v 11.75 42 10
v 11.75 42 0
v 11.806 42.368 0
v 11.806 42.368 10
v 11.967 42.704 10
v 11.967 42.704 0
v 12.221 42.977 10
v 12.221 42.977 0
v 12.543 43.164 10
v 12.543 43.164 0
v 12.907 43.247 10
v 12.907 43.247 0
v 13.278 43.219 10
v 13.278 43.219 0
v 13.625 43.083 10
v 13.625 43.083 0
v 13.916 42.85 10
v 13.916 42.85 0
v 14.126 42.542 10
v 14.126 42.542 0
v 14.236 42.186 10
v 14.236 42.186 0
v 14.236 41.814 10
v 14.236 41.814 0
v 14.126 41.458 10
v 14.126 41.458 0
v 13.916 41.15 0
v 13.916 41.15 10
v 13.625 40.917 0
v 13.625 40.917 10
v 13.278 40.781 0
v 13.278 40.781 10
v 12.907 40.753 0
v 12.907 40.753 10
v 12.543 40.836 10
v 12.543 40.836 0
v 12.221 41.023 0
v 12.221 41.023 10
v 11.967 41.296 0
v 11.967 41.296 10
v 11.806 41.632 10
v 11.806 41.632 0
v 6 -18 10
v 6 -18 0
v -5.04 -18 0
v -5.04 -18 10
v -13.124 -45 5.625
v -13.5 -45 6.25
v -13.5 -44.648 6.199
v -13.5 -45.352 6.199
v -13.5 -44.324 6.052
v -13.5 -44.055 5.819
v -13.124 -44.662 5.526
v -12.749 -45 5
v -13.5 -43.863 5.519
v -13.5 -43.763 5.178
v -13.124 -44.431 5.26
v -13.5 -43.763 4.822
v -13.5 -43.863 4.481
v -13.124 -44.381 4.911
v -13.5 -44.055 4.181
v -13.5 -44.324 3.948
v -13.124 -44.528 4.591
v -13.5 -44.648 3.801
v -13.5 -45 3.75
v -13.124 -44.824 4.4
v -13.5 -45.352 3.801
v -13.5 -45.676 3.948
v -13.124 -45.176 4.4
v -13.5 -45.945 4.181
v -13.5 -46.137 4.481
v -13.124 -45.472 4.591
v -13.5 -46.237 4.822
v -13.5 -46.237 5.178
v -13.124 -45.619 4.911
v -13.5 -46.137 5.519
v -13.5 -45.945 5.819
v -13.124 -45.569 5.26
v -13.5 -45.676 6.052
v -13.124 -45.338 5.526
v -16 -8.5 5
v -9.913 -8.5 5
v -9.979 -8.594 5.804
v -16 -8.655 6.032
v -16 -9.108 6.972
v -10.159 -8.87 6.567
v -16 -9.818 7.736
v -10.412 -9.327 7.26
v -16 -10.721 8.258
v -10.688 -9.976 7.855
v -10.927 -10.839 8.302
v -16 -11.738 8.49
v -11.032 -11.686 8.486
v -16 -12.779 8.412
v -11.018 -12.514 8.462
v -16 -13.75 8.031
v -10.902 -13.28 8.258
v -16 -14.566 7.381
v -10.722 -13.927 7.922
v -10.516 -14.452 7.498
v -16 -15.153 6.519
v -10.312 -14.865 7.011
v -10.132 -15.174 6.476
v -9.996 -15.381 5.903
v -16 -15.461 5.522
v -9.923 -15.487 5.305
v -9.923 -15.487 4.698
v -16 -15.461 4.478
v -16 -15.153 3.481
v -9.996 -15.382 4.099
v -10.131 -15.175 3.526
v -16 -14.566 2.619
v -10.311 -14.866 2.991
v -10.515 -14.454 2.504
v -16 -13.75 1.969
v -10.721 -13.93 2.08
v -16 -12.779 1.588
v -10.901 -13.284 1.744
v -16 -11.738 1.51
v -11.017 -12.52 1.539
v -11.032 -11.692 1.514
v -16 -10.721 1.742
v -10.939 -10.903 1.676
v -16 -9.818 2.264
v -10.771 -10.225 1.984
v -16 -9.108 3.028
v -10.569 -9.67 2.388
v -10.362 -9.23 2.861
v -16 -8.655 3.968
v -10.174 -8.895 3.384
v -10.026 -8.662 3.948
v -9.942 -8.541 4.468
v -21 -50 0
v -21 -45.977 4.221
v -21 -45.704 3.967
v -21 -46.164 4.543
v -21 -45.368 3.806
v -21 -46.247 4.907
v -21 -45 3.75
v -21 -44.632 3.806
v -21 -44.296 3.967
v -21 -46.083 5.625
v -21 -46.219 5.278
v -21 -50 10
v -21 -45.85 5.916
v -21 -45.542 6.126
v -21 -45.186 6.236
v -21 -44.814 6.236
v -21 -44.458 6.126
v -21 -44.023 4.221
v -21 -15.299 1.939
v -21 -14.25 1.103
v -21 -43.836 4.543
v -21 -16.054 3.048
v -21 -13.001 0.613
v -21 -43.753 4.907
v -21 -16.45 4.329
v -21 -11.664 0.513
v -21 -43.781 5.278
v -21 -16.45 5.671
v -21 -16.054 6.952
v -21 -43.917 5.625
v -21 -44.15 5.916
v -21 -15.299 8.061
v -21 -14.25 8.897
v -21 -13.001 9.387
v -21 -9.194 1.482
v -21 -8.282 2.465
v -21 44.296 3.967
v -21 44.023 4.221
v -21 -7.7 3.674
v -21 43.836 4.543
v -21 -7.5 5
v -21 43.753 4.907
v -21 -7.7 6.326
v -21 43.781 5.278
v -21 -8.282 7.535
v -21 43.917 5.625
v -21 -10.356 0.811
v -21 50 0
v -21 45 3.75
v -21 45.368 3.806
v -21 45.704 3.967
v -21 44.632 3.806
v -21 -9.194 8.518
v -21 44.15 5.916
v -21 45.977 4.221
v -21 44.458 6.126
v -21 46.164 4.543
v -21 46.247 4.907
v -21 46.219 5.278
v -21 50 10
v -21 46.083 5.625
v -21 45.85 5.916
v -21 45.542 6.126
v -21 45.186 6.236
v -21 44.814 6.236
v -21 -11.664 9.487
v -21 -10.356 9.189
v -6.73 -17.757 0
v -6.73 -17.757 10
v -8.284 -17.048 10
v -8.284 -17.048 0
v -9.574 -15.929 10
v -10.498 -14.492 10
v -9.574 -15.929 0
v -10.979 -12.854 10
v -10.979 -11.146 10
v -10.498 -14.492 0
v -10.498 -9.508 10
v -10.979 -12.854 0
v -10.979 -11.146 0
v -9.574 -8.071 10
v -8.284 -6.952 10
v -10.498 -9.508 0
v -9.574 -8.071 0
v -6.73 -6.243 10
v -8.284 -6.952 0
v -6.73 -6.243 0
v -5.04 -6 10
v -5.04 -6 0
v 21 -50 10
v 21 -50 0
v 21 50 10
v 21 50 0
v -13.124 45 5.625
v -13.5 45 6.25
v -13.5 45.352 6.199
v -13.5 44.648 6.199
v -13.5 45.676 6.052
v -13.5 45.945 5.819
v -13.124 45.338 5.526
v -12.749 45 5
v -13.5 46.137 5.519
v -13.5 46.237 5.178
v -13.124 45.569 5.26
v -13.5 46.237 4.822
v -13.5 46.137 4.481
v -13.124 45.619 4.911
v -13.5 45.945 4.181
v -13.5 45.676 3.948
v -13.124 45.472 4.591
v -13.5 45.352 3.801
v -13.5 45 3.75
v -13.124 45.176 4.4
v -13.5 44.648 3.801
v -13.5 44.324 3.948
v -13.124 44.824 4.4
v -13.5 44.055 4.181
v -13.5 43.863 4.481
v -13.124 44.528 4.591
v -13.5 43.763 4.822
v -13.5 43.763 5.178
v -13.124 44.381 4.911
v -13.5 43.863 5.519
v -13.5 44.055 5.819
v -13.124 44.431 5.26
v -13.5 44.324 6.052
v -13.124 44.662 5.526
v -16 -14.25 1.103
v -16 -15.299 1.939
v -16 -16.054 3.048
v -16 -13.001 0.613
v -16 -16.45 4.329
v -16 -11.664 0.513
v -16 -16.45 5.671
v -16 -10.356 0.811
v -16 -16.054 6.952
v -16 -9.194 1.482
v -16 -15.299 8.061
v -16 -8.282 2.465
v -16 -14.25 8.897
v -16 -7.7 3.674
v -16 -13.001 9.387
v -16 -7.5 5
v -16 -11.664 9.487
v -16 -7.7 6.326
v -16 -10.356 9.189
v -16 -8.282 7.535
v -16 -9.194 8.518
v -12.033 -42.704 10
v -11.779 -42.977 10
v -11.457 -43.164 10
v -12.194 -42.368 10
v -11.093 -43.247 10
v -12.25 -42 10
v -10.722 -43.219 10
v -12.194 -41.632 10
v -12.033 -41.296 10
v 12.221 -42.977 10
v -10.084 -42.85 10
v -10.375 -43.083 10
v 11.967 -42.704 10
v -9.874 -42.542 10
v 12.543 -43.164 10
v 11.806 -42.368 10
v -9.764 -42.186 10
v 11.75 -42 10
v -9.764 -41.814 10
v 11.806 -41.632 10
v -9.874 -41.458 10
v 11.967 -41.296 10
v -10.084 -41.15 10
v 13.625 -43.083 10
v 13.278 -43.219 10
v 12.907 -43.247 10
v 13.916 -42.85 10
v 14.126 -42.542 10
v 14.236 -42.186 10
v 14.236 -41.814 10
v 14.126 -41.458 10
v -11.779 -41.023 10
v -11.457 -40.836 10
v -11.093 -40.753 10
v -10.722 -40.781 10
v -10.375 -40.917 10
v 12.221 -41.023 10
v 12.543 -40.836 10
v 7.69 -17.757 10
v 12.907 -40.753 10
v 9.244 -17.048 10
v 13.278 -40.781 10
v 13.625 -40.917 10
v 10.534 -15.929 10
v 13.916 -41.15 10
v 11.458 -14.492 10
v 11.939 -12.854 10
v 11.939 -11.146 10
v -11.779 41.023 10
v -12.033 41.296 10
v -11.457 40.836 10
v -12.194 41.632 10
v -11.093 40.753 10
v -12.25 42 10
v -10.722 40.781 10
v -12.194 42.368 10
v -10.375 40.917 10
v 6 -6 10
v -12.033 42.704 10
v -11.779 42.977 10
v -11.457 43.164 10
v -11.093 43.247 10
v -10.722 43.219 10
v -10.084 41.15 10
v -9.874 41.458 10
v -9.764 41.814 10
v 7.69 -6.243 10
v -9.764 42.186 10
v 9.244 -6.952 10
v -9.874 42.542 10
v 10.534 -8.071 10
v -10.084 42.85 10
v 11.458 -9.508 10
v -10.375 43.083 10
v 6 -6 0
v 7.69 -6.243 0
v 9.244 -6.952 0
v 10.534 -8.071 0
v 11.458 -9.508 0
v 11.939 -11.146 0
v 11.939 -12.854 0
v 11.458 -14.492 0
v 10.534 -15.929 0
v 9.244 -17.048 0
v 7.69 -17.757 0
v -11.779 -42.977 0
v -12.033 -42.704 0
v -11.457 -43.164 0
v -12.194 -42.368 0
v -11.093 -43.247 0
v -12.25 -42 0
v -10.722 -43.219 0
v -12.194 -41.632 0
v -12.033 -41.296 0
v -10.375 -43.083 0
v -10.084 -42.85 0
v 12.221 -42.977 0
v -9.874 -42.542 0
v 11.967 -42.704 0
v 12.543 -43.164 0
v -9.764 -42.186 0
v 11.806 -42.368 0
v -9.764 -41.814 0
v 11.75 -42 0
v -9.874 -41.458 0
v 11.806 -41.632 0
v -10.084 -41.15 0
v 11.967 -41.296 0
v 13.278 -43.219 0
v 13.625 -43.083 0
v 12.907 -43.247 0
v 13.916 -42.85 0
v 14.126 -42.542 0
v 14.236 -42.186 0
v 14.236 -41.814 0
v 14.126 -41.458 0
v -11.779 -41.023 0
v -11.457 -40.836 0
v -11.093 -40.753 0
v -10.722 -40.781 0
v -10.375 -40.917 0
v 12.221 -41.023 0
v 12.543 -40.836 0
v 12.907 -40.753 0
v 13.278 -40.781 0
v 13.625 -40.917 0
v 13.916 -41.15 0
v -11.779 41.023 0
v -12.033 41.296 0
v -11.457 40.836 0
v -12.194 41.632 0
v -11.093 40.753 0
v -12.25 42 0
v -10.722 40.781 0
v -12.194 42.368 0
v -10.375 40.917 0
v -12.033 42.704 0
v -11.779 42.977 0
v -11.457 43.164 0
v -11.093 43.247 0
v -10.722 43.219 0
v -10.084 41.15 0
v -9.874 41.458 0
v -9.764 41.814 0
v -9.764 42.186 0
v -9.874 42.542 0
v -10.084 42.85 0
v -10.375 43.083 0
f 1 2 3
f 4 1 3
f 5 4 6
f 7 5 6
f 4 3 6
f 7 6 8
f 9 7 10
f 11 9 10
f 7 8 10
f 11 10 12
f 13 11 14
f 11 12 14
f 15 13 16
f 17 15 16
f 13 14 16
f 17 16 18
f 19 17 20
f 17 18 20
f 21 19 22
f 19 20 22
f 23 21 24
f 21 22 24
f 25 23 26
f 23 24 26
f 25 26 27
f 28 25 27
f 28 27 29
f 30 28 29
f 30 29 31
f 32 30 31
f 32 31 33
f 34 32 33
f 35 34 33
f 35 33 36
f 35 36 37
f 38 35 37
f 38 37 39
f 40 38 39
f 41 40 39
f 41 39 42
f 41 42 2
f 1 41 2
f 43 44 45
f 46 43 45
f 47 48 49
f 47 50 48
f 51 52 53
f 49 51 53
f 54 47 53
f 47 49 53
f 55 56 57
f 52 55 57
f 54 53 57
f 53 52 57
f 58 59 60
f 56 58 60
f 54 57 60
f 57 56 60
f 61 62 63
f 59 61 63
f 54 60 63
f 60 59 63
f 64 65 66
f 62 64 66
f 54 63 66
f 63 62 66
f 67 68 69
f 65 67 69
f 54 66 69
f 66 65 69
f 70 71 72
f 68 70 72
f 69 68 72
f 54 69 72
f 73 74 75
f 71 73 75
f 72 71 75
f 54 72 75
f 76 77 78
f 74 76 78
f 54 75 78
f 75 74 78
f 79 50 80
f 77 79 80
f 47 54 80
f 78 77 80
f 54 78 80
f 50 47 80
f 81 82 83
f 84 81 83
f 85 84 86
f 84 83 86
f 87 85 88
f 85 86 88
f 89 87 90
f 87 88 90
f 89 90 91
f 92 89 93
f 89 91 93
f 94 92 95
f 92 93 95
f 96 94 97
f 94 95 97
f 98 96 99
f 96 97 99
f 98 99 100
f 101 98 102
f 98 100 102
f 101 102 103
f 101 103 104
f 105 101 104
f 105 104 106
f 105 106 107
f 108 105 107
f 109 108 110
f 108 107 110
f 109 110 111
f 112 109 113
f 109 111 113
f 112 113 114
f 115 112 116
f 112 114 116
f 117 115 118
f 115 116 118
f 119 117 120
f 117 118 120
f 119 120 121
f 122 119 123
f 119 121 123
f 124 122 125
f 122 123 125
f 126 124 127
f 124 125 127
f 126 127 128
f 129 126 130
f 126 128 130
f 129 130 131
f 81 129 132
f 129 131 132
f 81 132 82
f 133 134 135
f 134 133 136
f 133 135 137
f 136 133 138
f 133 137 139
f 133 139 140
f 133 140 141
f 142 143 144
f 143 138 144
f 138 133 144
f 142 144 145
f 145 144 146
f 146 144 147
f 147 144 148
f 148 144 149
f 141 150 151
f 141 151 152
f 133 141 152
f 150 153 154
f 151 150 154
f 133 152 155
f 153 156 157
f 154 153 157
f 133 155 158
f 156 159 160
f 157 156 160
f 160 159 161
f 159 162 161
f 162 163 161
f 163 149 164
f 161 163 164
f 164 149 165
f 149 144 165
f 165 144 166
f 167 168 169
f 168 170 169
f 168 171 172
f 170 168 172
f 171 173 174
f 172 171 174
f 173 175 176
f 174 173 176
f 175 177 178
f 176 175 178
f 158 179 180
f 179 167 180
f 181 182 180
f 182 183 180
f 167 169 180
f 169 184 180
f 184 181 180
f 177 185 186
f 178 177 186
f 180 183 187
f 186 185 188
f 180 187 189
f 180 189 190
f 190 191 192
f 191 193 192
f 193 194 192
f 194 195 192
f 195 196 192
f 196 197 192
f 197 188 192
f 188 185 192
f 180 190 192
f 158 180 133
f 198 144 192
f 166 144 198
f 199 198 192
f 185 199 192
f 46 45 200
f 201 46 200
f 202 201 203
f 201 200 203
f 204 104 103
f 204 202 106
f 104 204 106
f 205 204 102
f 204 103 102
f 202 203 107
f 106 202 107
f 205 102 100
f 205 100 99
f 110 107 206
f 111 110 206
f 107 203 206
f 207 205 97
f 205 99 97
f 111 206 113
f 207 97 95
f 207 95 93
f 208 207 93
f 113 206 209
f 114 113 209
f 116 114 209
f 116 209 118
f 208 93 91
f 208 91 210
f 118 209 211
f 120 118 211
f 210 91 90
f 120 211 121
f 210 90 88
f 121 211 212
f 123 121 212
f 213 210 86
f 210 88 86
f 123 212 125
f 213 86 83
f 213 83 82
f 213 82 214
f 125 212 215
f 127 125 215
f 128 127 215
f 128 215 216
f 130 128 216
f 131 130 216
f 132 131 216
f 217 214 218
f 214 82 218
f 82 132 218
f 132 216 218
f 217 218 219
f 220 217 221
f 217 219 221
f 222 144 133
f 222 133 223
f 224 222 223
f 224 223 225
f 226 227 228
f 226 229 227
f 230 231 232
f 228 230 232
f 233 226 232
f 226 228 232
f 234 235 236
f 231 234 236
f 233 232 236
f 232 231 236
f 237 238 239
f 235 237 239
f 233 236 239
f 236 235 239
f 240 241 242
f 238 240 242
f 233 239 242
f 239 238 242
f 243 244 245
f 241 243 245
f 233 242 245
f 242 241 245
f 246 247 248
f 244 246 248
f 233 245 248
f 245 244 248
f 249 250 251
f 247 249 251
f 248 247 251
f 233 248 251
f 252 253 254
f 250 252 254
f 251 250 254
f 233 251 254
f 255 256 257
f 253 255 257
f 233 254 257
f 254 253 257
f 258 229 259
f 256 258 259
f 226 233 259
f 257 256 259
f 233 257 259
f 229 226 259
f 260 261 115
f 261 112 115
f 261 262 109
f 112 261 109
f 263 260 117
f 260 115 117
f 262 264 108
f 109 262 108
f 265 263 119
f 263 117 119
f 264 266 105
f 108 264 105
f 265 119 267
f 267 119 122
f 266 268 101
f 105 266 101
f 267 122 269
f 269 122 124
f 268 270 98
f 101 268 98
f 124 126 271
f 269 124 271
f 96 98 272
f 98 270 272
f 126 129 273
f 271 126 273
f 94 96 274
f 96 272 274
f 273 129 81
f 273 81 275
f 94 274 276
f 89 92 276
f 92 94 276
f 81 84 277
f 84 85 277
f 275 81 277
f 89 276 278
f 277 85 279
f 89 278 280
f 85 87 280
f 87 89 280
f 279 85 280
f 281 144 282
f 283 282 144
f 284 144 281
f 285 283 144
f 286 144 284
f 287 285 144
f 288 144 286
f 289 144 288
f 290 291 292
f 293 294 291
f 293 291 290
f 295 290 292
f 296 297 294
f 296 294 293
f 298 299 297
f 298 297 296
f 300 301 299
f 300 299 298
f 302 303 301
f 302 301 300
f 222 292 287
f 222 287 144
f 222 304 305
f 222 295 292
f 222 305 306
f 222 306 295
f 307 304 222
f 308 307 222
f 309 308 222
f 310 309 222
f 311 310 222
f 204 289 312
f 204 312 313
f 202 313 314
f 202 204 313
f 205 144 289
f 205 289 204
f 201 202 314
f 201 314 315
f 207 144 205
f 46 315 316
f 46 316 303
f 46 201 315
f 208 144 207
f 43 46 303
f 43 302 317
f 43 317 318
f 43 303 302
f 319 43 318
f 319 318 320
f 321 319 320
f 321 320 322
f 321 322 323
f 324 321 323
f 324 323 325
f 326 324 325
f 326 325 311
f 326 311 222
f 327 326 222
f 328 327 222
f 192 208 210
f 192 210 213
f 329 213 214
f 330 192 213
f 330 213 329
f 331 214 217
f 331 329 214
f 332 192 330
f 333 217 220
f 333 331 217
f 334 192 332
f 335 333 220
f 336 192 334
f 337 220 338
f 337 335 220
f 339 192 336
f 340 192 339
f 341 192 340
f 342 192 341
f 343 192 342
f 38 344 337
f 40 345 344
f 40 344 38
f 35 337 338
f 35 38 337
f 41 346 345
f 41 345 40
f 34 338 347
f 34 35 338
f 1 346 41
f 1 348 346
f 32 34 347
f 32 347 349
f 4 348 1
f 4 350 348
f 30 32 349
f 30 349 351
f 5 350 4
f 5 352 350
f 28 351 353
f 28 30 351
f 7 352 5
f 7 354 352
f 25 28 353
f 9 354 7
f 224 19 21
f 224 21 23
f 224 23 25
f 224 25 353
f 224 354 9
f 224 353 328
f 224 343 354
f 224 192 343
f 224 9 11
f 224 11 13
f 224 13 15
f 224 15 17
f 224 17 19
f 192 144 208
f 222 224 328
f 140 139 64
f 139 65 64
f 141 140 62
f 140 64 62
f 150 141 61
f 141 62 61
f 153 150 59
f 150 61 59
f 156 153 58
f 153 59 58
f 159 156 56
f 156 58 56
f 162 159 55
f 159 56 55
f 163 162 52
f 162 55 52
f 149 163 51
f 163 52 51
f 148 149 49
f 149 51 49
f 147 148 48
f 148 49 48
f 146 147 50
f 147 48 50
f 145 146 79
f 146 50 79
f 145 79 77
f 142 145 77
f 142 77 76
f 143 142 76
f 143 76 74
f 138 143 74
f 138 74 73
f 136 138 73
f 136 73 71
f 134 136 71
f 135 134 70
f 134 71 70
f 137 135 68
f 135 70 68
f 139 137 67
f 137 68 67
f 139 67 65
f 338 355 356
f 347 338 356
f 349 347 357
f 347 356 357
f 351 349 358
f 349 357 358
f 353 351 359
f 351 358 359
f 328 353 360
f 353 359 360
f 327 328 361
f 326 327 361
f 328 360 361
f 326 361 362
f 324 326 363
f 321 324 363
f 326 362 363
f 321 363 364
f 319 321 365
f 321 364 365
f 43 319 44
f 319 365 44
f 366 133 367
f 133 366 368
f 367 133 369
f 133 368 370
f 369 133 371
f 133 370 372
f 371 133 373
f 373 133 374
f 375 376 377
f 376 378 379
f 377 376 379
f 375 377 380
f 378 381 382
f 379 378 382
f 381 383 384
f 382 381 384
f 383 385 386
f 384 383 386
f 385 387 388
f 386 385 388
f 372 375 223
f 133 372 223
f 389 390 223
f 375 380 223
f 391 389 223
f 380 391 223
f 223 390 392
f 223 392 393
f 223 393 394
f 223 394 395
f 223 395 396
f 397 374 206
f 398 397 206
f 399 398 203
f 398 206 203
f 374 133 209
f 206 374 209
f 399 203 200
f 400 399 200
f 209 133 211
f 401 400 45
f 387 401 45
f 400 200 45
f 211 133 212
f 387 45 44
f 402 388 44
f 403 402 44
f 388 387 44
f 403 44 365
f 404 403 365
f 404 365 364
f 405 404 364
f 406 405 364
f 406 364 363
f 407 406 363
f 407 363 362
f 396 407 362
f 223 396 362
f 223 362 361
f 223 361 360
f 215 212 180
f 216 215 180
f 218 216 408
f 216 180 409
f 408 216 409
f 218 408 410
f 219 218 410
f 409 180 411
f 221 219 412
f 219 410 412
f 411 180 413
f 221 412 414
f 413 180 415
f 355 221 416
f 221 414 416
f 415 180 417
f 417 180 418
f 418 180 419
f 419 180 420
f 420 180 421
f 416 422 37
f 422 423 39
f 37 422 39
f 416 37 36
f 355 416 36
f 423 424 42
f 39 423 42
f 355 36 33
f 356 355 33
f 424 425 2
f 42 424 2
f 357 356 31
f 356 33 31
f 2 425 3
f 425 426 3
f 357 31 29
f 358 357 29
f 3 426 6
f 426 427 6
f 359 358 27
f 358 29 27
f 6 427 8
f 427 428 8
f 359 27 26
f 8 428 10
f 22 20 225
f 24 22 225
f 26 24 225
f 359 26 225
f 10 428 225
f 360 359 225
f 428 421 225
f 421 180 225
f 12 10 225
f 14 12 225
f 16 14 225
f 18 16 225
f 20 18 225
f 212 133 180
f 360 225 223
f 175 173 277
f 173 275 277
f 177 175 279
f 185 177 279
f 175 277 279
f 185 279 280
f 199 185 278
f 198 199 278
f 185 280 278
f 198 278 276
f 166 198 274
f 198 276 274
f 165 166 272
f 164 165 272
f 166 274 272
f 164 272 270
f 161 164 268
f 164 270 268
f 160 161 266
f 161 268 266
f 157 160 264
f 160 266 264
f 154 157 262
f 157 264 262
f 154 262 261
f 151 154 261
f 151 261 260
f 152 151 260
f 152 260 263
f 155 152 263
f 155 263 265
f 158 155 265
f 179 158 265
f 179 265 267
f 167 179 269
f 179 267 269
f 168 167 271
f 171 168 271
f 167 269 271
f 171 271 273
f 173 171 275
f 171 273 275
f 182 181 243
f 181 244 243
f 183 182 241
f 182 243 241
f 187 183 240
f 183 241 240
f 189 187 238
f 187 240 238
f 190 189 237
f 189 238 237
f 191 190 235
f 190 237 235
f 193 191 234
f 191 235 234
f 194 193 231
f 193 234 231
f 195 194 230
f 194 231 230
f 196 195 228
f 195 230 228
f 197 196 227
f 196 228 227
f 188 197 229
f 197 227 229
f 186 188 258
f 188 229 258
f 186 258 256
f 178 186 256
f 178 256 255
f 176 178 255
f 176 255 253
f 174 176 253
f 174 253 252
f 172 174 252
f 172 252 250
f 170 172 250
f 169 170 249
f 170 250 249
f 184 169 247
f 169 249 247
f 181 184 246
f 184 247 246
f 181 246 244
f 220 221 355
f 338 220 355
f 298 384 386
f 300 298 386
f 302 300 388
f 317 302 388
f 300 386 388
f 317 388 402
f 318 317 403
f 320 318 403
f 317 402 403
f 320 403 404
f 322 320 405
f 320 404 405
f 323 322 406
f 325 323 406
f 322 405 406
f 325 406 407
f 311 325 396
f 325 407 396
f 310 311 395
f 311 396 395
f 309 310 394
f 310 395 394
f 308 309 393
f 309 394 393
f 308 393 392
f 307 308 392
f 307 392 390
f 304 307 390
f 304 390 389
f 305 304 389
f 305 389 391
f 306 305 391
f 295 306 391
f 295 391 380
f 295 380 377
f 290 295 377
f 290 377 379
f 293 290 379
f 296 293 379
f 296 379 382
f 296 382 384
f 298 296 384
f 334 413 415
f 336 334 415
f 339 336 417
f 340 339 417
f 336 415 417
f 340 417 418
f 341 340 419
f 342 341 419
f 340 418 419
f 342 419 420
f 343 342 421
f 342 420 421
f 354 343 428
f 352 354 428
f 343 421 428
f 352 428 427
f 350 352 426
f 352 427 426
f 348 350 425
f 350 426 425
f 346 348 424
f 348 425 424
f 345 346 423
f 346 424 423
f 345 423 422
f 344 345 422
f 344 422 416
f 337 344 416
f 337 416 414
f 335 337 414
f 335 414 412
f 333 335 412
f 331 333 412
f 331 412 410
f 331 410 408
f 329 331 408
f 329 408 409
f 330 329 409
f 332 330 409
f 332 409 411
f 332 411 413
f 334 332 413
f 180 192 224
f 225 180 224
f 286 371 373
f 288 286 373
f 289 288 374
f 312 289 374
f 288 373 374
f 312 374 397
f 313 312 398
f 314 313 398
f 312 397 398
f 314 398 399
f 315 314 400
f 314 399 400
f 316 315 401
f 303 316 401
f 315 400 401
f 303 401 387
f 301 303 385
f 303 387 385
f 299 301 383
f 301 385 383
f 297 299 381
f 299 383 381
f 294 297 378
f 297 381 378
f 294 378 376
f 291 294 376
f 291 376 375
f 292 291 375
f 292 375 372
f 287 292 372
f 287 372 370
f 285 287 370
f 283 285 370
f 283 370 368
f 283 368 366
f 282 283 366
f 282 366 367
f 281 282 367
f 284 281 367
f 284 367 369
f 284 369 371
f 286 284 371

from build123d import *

# Parameters (mm, degrees)
SKETCH1_W                      = 42
SKETCH1_H                      = 100
BOSS_EXTRUDE1_DEPTH            = 10
CUT_EXTRUDE1_DEPTH             = 56.145262716
F_2_5_2_5_DIAMETER_HOLE1_D     = 2.5
F_2_5_2_5_DIAMETER_HOLE2_D     = 2.5
F_2_5_2_5_DIAMETER_HOLE2_DEPTH = 7.5
F_2_5_2_5_DIAMETER_HOLE2_TIP   = 0.751075774


# Read off the part's stored shape, not the designer's step: CBORE for M6 Hex Head Bolt1
with BuildPart() as part:
    # Sketch1 → Boss-Extrude1 (new body)
    with BuildSketch(Plane.XY.offset(10)):
        Rectangle(SKETCH1_W, SKETCH1_H)
    extrude(amount=-BOSS_EXTRUDE1_DEPTH)

    # Sketch2 → Cut-Extrude1 (cut, through all)
    with BuildSketch(Plane(origin=(0, 0, 0), x_dir=(-1, 0, 0), z_dir=(0, 0, -1))):
        with BuildLine():
            Line((5.04, -6), (-6, -6))
            ThreePointArc((-6, -6), (-12, -12), (-6, -18))
            Line((-6, -18), (5.04, -18))
            ThreePointArc((5.04, -18), (11.04, -12), (5.04, -6))
        make_face()
    extrude(amount=-CUT_EXTRUDE1_DEPTH, mode=Mode.SUBTRACT)

    # Ø2.5 (2.5) Diameter Hole1 (through all)
    with Locations(Plane.XY.offset(10)):
        with Locations((13, 42), (-11, 42), (-11, -42), (13, -42)):
            Hole(F_2_5_2_5_DIAMETER_HOLE1_D / 2)

    # CBORE for M6 Hex Head Bolt1 outline → CBORE for M6 Hex Head Bolt1 (revolve, cut)
    with BuildSketch(Plane(origin=(0, -12, 5), x_dir=(0, 1, 0), z_dir=(0, 0, -1))):
        Polygon((3.5, -16), (3.5, -9.913035616), (0, -9.913035616), (0, -21), (4.5, -21), (4.5, -16), align=None)
    revolve(axis=Axis((0, -12, 5), (1, 0, 0)), mode=Mode.SUBTRACT)

    # Ø2.5 (2.5) Diameter Hole2
    with Locations(Plane.ZY.offset(21)):
        with Locations((5, 45), (5, -45)):
            Hole(F_2_5_2_5_DIAMETER_HOLE2_D / 2, depth=F_2_5_2_5_DIAMETER_HOLE2_DEPTH)
            with Locations((0, 0, -(F_2_5_2_5_DIAMETER_HOLE2_DEPTH + F_2_5_2_5_DIAMETER_HOLE2_TIP / 2))):  # 118° drill point
                Cone(0, F_2_5_2_5_DIAMETER_HOLE2_D / 2, F_2_5_2_5_DIAMETER_HOLE2_TIP, mode=Mode.SUBTRACT)


solid = part.part
